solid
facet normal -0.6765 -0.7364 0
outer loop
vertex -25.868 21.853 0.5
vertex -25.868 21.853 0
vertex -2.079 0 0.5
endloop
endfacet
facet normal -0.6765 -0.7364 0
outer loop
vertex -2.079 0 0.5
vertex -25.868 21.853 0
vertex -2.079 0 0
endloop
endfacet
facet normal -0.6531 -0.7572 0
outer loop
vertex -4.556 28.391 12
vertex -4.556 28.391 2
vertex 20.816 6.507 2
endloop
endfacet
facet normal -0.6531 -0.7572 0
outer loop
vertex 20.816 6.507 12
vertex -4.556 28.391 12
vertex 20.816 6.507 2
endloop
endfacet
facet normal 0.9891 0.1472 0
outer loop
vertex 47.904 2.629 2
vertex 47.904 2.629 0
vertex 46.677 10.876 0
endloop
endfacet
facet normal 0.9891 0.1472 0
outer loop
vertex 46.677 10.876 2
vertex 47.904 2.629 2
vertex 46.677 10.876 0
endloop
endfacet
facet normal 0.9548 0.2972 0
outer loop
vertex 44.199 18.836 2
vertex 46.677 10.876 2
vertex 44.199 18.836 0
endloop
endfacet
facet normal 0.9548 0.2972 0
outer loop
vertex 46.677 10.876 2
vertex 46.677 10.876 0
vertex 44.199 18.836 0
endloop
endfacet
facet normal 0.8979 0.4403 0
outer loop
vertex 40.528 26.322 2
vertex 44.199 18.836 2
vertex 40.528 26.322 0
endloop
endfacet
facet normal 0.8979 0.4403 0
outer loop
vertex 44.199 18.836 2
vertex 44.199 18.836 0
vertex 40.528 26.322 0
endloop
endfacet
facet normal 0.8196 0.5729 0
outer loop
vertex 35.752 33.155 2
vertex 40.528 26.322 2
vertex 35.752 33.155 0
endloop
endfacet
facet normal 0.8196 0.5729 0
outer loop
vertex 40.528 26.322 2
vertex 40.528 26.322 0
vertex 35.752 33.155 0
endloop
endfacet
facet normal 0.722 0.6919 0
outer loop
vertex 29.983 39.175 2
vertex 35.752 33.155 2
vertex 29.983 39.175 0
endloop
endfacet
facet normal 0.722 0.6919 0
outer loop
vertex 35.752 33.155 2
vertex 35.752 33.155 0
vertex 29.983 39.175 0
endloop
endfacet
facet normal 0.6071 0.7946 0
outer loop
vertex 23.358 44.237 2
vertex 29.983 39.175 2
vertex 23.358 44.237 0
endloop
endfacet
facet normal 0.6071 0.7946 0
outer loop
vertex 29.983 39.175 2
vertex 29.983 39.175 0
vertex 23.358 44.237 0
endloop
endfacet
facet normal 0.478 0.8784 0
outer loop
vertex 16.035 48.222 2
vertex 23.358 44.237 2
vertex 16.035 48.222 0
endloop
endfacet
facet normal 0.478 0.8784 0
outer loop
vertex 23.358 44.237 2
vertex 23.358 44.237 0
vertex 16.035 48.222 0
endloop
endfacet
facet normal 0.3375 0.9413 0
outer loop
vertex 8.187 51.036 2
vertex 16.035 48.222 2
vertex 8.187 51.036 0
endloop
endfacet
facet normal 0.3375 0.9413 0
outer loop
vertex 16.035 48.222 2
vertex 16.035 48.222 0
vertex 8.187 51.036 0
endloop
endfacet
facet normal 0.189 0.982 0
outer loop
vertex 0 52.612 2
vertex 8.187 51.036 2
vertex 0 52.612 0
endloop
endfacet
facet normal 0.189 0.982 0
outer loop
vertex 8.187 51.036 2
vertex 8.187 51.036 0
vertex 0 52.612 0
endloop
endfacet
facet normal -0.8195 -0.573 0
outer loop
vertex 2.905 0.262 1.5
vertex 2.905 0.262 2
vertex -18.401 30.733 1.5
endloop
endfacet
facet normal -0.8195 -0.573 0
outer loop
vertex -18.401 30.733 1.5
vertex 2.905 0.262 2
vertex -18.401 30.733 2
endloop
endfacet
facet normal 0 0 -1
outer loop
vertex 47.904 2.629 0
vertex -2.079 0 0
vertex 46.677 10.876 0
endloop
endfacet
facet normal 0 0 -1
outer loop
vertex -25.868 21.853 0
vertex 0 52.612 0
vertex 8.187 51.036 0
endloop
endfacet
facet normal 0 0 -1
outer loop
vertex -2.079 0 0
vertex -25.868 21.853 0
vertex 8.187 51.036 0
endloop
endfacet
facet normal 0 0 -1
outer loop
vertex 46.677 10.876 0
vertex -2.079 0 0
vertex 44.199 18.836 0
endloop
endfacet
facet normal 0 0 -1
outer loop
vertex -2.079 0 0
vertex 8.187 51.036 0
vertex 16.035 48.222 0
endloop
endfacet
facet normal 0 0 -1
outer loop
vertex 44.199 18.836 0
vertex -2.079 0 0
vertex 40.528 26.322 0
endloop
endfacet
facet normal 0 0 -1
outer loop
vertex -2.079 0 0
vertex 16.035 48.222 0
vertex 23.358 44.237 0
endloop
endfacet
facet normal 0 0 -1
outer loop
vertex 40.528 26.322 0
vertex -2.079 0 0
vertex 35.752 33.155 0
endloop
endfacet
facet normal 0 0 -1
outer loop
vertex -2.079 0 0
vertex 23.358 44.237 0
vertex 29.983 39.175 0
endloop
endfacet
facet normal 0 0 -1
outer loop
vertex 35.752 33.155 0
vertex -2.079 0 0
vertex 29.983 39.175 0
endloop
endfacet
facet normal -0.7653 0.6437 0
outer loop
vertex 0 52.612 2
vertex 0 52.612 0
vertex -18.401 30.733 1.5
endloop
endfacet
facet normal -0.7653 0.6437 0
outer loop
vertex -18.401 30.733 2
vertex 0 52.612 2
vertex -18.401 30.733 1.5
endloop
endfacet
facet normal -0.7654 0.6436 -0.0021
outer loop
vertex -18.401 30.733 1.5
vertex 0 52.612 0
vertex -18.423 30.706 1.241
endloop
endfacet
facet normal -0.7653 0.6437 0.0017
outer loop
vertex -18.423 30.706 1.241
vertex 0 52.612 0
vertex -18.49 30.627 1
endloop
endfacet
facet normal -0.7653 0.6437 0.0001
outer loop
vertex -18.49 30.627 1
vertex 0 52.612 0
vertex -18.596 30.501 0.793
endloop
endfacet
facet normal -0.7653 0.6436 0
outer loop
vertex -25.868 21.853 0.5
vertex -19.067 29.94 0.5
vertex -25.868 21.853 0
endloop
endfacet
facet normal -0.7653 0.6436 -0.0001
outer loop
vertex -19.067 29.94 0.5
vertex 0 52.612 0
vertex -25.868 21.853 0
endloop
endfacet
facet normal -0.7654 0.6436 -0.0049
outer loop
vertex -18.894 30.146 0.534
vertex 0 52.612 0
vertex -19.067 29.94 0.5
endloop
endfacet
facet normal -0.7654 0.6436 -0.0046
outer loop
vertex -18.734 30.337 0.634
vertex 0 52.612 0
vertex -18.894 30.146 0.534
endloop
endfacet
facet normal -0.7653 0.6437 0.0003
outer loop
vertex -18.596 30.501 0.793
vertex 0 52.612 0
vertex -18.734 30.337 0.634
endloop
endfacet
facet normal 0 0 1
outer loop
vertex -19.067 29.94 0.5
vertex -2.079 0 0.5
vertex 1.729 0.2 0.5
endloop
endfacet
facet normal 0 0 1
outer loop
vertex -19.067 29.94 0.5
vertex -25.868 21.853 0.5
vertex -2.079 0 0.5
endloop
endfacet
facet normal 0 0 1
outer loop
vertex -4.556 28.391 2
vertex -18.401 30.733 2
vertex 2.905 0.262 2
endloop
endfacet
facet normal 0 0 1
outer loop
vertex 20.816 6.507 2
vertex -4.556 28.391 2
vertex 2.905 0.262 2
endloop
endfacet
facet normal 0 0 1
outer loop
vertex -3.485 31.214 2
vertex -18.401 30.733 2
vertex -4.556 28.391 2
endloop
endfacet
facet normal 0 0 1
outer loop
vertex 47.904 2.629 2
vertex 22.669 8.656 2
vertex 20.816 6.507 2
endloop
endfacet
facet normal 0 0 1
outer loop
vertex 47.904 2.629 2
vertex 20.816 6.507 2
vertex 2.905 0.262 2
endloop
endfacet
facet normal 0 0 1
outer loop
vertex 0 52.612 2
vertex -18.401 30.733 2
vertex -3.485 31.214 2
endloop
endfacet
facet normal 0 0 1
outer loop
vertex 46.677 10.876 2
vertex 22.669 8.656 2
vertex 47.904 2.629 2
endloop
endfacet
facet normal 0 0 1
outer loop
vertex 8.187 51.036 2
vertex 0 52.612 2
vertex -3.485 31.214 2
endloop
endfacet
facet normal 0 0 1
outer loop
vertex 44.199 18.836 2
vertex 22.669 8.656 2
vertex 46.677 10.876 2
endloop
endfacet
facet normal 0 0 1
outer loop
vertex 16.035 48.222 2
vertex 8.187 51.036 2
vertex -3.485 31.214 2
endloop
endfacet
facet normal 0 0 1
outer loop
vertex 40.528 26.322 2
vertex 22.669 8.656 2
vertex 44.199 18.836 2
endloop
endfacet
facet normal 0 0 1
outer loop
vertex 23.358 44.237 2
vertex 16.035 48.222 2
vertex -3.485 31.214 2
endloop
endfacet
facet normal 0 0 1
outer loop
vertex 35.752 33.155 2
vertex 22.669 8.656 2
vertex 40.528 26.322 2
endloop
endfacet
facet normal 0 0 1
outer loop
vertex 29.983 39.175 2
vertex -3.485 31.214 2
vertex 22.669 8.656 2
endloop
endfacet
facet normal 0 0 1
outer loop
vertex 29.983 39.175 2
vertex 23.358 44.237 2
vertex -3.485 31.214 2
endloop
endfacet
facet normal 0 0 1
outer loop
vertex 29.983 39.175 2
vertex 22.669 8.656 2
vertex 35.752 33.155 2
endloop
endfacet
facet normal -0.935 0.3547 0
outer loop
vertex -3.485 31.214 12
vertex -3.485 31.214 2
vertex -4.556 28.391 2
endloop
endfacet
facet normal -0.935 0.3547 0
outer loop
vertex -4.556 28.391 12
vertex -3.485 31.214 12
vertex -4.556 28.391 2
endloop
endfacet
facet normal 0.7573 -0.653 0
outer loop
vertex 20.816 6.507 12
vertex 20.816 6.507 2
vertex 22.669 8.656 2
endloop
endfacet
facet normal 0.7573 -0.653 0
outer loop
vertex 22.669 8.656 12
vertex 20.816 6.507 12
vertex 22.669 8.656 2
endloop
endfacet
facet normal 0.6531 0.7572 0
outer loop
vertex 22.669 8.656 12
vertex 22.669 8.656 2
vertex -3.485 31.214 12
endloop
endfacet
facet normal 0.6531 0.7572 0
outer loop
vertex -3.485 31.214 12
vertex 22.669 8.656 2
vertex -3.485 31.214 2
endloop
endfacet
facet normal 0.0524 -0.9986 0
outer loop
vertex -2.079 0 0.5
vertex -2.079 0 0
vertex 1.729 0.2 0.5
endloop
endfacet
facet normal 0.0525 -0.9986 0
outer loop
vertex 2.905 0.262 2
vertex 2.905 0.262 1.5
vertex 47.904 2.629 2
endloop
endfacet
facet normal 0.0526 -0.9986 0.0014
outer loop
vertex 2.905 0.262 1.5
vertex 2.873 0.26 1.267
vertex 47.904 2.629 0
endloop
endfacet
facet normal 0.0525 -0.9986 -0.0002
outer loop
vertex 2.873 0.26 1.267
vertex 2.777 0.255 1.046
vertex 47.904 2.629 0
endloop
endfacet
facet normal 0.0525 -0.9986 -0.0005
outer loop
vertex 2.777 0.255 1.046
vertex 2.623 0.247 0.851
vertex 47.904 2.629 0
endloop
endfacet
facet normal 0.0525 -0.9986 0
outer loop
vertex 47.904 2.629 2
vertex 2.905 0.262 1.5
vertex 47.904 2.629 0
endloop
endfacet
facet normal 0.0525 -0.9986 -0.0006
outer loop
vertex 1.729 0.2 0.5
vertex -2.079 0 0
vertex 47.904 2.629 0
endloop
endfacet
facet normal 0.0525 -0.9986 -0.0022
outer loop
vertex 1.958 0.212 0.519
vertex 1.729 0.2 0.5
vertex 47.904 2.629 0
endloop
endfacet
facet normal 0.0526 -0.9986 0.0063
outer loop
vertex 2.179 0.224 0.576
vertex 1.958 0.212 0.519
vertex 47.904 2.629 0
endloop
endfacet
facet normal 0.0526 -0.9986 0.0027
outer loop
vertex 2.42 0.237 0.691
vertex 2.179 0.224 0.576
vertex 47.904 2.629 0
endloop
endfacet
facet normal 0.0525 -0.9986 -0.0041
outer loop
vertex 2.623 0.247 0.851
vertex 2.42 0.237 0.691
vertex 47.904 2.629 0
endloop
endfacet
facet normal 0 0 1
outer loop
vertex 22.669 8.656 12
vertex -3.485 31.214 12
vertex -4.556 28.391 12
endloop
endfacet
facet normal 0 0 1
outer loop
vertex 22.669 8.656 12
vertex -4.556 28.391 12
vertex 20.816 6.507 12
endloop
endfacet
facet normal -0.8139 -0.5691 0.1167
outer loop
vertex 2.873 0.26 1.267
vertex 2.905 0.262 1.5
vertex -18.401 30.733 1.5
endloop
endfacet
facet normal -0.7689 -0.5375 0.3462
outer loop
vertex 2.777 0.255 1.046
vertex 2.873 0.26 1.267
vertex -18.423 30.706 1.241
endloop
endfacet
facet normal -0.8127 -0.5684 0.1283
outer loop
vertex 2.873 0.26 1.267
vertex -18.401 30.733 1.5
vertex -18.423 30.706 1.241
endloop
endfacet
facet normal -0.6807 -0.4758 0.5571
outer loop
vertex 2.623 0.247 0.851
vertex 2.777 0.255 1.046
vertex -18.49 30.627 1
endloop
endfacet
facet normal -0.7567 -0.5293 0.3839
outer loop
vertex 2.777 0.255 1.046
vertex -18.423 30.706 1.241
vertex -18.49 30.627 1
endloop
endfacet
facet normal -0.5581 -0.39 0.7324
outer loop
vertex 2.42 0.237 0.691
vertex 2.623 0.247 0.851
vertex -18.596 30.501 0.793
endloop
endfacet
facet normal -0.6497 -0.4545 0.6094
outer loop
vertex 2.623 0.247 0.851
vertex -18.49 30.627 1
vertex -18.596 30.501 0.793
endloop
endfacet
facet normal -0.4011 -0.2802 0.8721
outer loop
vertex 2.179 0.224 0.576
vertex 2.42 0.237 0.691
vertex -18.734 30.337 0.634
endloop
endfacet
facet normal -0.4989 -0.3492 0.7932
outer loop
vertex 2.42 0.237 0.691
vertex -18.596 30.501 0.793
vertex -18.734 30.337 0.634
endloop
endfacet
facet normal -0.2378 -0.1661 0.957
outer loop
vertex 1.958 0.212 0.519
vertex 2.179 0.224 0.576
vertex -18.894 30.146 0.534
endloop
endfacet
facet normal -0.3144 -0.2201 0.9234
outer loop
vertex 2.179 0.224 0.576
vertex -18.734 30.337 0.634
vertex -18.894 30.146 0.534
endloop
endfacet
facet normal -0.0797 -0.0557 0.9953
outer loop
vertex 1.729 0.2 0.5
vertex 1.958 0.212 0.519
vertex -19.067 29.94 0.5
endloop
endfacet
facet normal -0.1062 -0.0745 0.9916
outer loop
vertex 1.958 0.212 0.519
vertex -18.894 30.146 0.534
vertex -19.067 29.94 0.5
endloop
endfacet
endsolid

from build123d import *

# Parameters (mm, degrees)
F1_DEPTH = 2
F3_DEPTH = 10
F5_DEPTH = 1
F6_DEPTH = 0.5
F7_R     = 1


with BuildPart() as f1:
    # F0 (on Top) → F1 (new body)
    with BuildSketch(Plane.XY):
        with BuildLine():
            Line((-2.078642603, 0), (47.9039736092, 2.6289783418))
            ThreePointArc((47.9039736092, 2.6289783418), (32.9834717321, 36.2761769642), (0, 52.6115968823))
            Line((0, 52.6115968823), (-25.8684456348, 21.8530613929))
            Line((-25.8684456348, 21.8530613929), (-2.078642603, 0))
        make_face()
    extrude(amount=F1_DEPTH)

    # F2 (on face) → F3 (join)
    with BuildSketch(Plane.XY.offset(2)):
        Polygon((-3.4849730935, 31.2140034176), (-4.5563918538, 28.3914133906), (20.8157394081, 6.5072686411), (22.6687969397, 8.6556742318), align=None)
    extrude(amount=F3_DEPTH)

    # F4 (on face) → F5 (cut)
    with BuildSketch(Plane.XY.offset(2)):
        Polygon((-2.078642603, 0), (2.9054336124, 0.2621517123), (-18.4005183491, 30.7327022377), (-25.8684456348, 21.8530613929), align=None)
    extrude(amount=-F5_DEPTH, mode=Mode.SUBTRACT)

    # F6 (cut): a face of the model
    f6_faces = [f1.faces().sort_by_distance(p)[0] for p in [
        (-12.6099622949, 15.3981218479, 1),
    ]]
    extrude(f6_faces, amount=-F6_DEPTH, mode=Mode.SUBTRACT)

    # F7
    f7_edges = [f1.edges().sort_by_distance(p)[0] for p in [
        (-7.747542, 15.497427, 0.5),
    ]]
    fillet(f7_edges, radius=F7_R)


solid = f1.part
